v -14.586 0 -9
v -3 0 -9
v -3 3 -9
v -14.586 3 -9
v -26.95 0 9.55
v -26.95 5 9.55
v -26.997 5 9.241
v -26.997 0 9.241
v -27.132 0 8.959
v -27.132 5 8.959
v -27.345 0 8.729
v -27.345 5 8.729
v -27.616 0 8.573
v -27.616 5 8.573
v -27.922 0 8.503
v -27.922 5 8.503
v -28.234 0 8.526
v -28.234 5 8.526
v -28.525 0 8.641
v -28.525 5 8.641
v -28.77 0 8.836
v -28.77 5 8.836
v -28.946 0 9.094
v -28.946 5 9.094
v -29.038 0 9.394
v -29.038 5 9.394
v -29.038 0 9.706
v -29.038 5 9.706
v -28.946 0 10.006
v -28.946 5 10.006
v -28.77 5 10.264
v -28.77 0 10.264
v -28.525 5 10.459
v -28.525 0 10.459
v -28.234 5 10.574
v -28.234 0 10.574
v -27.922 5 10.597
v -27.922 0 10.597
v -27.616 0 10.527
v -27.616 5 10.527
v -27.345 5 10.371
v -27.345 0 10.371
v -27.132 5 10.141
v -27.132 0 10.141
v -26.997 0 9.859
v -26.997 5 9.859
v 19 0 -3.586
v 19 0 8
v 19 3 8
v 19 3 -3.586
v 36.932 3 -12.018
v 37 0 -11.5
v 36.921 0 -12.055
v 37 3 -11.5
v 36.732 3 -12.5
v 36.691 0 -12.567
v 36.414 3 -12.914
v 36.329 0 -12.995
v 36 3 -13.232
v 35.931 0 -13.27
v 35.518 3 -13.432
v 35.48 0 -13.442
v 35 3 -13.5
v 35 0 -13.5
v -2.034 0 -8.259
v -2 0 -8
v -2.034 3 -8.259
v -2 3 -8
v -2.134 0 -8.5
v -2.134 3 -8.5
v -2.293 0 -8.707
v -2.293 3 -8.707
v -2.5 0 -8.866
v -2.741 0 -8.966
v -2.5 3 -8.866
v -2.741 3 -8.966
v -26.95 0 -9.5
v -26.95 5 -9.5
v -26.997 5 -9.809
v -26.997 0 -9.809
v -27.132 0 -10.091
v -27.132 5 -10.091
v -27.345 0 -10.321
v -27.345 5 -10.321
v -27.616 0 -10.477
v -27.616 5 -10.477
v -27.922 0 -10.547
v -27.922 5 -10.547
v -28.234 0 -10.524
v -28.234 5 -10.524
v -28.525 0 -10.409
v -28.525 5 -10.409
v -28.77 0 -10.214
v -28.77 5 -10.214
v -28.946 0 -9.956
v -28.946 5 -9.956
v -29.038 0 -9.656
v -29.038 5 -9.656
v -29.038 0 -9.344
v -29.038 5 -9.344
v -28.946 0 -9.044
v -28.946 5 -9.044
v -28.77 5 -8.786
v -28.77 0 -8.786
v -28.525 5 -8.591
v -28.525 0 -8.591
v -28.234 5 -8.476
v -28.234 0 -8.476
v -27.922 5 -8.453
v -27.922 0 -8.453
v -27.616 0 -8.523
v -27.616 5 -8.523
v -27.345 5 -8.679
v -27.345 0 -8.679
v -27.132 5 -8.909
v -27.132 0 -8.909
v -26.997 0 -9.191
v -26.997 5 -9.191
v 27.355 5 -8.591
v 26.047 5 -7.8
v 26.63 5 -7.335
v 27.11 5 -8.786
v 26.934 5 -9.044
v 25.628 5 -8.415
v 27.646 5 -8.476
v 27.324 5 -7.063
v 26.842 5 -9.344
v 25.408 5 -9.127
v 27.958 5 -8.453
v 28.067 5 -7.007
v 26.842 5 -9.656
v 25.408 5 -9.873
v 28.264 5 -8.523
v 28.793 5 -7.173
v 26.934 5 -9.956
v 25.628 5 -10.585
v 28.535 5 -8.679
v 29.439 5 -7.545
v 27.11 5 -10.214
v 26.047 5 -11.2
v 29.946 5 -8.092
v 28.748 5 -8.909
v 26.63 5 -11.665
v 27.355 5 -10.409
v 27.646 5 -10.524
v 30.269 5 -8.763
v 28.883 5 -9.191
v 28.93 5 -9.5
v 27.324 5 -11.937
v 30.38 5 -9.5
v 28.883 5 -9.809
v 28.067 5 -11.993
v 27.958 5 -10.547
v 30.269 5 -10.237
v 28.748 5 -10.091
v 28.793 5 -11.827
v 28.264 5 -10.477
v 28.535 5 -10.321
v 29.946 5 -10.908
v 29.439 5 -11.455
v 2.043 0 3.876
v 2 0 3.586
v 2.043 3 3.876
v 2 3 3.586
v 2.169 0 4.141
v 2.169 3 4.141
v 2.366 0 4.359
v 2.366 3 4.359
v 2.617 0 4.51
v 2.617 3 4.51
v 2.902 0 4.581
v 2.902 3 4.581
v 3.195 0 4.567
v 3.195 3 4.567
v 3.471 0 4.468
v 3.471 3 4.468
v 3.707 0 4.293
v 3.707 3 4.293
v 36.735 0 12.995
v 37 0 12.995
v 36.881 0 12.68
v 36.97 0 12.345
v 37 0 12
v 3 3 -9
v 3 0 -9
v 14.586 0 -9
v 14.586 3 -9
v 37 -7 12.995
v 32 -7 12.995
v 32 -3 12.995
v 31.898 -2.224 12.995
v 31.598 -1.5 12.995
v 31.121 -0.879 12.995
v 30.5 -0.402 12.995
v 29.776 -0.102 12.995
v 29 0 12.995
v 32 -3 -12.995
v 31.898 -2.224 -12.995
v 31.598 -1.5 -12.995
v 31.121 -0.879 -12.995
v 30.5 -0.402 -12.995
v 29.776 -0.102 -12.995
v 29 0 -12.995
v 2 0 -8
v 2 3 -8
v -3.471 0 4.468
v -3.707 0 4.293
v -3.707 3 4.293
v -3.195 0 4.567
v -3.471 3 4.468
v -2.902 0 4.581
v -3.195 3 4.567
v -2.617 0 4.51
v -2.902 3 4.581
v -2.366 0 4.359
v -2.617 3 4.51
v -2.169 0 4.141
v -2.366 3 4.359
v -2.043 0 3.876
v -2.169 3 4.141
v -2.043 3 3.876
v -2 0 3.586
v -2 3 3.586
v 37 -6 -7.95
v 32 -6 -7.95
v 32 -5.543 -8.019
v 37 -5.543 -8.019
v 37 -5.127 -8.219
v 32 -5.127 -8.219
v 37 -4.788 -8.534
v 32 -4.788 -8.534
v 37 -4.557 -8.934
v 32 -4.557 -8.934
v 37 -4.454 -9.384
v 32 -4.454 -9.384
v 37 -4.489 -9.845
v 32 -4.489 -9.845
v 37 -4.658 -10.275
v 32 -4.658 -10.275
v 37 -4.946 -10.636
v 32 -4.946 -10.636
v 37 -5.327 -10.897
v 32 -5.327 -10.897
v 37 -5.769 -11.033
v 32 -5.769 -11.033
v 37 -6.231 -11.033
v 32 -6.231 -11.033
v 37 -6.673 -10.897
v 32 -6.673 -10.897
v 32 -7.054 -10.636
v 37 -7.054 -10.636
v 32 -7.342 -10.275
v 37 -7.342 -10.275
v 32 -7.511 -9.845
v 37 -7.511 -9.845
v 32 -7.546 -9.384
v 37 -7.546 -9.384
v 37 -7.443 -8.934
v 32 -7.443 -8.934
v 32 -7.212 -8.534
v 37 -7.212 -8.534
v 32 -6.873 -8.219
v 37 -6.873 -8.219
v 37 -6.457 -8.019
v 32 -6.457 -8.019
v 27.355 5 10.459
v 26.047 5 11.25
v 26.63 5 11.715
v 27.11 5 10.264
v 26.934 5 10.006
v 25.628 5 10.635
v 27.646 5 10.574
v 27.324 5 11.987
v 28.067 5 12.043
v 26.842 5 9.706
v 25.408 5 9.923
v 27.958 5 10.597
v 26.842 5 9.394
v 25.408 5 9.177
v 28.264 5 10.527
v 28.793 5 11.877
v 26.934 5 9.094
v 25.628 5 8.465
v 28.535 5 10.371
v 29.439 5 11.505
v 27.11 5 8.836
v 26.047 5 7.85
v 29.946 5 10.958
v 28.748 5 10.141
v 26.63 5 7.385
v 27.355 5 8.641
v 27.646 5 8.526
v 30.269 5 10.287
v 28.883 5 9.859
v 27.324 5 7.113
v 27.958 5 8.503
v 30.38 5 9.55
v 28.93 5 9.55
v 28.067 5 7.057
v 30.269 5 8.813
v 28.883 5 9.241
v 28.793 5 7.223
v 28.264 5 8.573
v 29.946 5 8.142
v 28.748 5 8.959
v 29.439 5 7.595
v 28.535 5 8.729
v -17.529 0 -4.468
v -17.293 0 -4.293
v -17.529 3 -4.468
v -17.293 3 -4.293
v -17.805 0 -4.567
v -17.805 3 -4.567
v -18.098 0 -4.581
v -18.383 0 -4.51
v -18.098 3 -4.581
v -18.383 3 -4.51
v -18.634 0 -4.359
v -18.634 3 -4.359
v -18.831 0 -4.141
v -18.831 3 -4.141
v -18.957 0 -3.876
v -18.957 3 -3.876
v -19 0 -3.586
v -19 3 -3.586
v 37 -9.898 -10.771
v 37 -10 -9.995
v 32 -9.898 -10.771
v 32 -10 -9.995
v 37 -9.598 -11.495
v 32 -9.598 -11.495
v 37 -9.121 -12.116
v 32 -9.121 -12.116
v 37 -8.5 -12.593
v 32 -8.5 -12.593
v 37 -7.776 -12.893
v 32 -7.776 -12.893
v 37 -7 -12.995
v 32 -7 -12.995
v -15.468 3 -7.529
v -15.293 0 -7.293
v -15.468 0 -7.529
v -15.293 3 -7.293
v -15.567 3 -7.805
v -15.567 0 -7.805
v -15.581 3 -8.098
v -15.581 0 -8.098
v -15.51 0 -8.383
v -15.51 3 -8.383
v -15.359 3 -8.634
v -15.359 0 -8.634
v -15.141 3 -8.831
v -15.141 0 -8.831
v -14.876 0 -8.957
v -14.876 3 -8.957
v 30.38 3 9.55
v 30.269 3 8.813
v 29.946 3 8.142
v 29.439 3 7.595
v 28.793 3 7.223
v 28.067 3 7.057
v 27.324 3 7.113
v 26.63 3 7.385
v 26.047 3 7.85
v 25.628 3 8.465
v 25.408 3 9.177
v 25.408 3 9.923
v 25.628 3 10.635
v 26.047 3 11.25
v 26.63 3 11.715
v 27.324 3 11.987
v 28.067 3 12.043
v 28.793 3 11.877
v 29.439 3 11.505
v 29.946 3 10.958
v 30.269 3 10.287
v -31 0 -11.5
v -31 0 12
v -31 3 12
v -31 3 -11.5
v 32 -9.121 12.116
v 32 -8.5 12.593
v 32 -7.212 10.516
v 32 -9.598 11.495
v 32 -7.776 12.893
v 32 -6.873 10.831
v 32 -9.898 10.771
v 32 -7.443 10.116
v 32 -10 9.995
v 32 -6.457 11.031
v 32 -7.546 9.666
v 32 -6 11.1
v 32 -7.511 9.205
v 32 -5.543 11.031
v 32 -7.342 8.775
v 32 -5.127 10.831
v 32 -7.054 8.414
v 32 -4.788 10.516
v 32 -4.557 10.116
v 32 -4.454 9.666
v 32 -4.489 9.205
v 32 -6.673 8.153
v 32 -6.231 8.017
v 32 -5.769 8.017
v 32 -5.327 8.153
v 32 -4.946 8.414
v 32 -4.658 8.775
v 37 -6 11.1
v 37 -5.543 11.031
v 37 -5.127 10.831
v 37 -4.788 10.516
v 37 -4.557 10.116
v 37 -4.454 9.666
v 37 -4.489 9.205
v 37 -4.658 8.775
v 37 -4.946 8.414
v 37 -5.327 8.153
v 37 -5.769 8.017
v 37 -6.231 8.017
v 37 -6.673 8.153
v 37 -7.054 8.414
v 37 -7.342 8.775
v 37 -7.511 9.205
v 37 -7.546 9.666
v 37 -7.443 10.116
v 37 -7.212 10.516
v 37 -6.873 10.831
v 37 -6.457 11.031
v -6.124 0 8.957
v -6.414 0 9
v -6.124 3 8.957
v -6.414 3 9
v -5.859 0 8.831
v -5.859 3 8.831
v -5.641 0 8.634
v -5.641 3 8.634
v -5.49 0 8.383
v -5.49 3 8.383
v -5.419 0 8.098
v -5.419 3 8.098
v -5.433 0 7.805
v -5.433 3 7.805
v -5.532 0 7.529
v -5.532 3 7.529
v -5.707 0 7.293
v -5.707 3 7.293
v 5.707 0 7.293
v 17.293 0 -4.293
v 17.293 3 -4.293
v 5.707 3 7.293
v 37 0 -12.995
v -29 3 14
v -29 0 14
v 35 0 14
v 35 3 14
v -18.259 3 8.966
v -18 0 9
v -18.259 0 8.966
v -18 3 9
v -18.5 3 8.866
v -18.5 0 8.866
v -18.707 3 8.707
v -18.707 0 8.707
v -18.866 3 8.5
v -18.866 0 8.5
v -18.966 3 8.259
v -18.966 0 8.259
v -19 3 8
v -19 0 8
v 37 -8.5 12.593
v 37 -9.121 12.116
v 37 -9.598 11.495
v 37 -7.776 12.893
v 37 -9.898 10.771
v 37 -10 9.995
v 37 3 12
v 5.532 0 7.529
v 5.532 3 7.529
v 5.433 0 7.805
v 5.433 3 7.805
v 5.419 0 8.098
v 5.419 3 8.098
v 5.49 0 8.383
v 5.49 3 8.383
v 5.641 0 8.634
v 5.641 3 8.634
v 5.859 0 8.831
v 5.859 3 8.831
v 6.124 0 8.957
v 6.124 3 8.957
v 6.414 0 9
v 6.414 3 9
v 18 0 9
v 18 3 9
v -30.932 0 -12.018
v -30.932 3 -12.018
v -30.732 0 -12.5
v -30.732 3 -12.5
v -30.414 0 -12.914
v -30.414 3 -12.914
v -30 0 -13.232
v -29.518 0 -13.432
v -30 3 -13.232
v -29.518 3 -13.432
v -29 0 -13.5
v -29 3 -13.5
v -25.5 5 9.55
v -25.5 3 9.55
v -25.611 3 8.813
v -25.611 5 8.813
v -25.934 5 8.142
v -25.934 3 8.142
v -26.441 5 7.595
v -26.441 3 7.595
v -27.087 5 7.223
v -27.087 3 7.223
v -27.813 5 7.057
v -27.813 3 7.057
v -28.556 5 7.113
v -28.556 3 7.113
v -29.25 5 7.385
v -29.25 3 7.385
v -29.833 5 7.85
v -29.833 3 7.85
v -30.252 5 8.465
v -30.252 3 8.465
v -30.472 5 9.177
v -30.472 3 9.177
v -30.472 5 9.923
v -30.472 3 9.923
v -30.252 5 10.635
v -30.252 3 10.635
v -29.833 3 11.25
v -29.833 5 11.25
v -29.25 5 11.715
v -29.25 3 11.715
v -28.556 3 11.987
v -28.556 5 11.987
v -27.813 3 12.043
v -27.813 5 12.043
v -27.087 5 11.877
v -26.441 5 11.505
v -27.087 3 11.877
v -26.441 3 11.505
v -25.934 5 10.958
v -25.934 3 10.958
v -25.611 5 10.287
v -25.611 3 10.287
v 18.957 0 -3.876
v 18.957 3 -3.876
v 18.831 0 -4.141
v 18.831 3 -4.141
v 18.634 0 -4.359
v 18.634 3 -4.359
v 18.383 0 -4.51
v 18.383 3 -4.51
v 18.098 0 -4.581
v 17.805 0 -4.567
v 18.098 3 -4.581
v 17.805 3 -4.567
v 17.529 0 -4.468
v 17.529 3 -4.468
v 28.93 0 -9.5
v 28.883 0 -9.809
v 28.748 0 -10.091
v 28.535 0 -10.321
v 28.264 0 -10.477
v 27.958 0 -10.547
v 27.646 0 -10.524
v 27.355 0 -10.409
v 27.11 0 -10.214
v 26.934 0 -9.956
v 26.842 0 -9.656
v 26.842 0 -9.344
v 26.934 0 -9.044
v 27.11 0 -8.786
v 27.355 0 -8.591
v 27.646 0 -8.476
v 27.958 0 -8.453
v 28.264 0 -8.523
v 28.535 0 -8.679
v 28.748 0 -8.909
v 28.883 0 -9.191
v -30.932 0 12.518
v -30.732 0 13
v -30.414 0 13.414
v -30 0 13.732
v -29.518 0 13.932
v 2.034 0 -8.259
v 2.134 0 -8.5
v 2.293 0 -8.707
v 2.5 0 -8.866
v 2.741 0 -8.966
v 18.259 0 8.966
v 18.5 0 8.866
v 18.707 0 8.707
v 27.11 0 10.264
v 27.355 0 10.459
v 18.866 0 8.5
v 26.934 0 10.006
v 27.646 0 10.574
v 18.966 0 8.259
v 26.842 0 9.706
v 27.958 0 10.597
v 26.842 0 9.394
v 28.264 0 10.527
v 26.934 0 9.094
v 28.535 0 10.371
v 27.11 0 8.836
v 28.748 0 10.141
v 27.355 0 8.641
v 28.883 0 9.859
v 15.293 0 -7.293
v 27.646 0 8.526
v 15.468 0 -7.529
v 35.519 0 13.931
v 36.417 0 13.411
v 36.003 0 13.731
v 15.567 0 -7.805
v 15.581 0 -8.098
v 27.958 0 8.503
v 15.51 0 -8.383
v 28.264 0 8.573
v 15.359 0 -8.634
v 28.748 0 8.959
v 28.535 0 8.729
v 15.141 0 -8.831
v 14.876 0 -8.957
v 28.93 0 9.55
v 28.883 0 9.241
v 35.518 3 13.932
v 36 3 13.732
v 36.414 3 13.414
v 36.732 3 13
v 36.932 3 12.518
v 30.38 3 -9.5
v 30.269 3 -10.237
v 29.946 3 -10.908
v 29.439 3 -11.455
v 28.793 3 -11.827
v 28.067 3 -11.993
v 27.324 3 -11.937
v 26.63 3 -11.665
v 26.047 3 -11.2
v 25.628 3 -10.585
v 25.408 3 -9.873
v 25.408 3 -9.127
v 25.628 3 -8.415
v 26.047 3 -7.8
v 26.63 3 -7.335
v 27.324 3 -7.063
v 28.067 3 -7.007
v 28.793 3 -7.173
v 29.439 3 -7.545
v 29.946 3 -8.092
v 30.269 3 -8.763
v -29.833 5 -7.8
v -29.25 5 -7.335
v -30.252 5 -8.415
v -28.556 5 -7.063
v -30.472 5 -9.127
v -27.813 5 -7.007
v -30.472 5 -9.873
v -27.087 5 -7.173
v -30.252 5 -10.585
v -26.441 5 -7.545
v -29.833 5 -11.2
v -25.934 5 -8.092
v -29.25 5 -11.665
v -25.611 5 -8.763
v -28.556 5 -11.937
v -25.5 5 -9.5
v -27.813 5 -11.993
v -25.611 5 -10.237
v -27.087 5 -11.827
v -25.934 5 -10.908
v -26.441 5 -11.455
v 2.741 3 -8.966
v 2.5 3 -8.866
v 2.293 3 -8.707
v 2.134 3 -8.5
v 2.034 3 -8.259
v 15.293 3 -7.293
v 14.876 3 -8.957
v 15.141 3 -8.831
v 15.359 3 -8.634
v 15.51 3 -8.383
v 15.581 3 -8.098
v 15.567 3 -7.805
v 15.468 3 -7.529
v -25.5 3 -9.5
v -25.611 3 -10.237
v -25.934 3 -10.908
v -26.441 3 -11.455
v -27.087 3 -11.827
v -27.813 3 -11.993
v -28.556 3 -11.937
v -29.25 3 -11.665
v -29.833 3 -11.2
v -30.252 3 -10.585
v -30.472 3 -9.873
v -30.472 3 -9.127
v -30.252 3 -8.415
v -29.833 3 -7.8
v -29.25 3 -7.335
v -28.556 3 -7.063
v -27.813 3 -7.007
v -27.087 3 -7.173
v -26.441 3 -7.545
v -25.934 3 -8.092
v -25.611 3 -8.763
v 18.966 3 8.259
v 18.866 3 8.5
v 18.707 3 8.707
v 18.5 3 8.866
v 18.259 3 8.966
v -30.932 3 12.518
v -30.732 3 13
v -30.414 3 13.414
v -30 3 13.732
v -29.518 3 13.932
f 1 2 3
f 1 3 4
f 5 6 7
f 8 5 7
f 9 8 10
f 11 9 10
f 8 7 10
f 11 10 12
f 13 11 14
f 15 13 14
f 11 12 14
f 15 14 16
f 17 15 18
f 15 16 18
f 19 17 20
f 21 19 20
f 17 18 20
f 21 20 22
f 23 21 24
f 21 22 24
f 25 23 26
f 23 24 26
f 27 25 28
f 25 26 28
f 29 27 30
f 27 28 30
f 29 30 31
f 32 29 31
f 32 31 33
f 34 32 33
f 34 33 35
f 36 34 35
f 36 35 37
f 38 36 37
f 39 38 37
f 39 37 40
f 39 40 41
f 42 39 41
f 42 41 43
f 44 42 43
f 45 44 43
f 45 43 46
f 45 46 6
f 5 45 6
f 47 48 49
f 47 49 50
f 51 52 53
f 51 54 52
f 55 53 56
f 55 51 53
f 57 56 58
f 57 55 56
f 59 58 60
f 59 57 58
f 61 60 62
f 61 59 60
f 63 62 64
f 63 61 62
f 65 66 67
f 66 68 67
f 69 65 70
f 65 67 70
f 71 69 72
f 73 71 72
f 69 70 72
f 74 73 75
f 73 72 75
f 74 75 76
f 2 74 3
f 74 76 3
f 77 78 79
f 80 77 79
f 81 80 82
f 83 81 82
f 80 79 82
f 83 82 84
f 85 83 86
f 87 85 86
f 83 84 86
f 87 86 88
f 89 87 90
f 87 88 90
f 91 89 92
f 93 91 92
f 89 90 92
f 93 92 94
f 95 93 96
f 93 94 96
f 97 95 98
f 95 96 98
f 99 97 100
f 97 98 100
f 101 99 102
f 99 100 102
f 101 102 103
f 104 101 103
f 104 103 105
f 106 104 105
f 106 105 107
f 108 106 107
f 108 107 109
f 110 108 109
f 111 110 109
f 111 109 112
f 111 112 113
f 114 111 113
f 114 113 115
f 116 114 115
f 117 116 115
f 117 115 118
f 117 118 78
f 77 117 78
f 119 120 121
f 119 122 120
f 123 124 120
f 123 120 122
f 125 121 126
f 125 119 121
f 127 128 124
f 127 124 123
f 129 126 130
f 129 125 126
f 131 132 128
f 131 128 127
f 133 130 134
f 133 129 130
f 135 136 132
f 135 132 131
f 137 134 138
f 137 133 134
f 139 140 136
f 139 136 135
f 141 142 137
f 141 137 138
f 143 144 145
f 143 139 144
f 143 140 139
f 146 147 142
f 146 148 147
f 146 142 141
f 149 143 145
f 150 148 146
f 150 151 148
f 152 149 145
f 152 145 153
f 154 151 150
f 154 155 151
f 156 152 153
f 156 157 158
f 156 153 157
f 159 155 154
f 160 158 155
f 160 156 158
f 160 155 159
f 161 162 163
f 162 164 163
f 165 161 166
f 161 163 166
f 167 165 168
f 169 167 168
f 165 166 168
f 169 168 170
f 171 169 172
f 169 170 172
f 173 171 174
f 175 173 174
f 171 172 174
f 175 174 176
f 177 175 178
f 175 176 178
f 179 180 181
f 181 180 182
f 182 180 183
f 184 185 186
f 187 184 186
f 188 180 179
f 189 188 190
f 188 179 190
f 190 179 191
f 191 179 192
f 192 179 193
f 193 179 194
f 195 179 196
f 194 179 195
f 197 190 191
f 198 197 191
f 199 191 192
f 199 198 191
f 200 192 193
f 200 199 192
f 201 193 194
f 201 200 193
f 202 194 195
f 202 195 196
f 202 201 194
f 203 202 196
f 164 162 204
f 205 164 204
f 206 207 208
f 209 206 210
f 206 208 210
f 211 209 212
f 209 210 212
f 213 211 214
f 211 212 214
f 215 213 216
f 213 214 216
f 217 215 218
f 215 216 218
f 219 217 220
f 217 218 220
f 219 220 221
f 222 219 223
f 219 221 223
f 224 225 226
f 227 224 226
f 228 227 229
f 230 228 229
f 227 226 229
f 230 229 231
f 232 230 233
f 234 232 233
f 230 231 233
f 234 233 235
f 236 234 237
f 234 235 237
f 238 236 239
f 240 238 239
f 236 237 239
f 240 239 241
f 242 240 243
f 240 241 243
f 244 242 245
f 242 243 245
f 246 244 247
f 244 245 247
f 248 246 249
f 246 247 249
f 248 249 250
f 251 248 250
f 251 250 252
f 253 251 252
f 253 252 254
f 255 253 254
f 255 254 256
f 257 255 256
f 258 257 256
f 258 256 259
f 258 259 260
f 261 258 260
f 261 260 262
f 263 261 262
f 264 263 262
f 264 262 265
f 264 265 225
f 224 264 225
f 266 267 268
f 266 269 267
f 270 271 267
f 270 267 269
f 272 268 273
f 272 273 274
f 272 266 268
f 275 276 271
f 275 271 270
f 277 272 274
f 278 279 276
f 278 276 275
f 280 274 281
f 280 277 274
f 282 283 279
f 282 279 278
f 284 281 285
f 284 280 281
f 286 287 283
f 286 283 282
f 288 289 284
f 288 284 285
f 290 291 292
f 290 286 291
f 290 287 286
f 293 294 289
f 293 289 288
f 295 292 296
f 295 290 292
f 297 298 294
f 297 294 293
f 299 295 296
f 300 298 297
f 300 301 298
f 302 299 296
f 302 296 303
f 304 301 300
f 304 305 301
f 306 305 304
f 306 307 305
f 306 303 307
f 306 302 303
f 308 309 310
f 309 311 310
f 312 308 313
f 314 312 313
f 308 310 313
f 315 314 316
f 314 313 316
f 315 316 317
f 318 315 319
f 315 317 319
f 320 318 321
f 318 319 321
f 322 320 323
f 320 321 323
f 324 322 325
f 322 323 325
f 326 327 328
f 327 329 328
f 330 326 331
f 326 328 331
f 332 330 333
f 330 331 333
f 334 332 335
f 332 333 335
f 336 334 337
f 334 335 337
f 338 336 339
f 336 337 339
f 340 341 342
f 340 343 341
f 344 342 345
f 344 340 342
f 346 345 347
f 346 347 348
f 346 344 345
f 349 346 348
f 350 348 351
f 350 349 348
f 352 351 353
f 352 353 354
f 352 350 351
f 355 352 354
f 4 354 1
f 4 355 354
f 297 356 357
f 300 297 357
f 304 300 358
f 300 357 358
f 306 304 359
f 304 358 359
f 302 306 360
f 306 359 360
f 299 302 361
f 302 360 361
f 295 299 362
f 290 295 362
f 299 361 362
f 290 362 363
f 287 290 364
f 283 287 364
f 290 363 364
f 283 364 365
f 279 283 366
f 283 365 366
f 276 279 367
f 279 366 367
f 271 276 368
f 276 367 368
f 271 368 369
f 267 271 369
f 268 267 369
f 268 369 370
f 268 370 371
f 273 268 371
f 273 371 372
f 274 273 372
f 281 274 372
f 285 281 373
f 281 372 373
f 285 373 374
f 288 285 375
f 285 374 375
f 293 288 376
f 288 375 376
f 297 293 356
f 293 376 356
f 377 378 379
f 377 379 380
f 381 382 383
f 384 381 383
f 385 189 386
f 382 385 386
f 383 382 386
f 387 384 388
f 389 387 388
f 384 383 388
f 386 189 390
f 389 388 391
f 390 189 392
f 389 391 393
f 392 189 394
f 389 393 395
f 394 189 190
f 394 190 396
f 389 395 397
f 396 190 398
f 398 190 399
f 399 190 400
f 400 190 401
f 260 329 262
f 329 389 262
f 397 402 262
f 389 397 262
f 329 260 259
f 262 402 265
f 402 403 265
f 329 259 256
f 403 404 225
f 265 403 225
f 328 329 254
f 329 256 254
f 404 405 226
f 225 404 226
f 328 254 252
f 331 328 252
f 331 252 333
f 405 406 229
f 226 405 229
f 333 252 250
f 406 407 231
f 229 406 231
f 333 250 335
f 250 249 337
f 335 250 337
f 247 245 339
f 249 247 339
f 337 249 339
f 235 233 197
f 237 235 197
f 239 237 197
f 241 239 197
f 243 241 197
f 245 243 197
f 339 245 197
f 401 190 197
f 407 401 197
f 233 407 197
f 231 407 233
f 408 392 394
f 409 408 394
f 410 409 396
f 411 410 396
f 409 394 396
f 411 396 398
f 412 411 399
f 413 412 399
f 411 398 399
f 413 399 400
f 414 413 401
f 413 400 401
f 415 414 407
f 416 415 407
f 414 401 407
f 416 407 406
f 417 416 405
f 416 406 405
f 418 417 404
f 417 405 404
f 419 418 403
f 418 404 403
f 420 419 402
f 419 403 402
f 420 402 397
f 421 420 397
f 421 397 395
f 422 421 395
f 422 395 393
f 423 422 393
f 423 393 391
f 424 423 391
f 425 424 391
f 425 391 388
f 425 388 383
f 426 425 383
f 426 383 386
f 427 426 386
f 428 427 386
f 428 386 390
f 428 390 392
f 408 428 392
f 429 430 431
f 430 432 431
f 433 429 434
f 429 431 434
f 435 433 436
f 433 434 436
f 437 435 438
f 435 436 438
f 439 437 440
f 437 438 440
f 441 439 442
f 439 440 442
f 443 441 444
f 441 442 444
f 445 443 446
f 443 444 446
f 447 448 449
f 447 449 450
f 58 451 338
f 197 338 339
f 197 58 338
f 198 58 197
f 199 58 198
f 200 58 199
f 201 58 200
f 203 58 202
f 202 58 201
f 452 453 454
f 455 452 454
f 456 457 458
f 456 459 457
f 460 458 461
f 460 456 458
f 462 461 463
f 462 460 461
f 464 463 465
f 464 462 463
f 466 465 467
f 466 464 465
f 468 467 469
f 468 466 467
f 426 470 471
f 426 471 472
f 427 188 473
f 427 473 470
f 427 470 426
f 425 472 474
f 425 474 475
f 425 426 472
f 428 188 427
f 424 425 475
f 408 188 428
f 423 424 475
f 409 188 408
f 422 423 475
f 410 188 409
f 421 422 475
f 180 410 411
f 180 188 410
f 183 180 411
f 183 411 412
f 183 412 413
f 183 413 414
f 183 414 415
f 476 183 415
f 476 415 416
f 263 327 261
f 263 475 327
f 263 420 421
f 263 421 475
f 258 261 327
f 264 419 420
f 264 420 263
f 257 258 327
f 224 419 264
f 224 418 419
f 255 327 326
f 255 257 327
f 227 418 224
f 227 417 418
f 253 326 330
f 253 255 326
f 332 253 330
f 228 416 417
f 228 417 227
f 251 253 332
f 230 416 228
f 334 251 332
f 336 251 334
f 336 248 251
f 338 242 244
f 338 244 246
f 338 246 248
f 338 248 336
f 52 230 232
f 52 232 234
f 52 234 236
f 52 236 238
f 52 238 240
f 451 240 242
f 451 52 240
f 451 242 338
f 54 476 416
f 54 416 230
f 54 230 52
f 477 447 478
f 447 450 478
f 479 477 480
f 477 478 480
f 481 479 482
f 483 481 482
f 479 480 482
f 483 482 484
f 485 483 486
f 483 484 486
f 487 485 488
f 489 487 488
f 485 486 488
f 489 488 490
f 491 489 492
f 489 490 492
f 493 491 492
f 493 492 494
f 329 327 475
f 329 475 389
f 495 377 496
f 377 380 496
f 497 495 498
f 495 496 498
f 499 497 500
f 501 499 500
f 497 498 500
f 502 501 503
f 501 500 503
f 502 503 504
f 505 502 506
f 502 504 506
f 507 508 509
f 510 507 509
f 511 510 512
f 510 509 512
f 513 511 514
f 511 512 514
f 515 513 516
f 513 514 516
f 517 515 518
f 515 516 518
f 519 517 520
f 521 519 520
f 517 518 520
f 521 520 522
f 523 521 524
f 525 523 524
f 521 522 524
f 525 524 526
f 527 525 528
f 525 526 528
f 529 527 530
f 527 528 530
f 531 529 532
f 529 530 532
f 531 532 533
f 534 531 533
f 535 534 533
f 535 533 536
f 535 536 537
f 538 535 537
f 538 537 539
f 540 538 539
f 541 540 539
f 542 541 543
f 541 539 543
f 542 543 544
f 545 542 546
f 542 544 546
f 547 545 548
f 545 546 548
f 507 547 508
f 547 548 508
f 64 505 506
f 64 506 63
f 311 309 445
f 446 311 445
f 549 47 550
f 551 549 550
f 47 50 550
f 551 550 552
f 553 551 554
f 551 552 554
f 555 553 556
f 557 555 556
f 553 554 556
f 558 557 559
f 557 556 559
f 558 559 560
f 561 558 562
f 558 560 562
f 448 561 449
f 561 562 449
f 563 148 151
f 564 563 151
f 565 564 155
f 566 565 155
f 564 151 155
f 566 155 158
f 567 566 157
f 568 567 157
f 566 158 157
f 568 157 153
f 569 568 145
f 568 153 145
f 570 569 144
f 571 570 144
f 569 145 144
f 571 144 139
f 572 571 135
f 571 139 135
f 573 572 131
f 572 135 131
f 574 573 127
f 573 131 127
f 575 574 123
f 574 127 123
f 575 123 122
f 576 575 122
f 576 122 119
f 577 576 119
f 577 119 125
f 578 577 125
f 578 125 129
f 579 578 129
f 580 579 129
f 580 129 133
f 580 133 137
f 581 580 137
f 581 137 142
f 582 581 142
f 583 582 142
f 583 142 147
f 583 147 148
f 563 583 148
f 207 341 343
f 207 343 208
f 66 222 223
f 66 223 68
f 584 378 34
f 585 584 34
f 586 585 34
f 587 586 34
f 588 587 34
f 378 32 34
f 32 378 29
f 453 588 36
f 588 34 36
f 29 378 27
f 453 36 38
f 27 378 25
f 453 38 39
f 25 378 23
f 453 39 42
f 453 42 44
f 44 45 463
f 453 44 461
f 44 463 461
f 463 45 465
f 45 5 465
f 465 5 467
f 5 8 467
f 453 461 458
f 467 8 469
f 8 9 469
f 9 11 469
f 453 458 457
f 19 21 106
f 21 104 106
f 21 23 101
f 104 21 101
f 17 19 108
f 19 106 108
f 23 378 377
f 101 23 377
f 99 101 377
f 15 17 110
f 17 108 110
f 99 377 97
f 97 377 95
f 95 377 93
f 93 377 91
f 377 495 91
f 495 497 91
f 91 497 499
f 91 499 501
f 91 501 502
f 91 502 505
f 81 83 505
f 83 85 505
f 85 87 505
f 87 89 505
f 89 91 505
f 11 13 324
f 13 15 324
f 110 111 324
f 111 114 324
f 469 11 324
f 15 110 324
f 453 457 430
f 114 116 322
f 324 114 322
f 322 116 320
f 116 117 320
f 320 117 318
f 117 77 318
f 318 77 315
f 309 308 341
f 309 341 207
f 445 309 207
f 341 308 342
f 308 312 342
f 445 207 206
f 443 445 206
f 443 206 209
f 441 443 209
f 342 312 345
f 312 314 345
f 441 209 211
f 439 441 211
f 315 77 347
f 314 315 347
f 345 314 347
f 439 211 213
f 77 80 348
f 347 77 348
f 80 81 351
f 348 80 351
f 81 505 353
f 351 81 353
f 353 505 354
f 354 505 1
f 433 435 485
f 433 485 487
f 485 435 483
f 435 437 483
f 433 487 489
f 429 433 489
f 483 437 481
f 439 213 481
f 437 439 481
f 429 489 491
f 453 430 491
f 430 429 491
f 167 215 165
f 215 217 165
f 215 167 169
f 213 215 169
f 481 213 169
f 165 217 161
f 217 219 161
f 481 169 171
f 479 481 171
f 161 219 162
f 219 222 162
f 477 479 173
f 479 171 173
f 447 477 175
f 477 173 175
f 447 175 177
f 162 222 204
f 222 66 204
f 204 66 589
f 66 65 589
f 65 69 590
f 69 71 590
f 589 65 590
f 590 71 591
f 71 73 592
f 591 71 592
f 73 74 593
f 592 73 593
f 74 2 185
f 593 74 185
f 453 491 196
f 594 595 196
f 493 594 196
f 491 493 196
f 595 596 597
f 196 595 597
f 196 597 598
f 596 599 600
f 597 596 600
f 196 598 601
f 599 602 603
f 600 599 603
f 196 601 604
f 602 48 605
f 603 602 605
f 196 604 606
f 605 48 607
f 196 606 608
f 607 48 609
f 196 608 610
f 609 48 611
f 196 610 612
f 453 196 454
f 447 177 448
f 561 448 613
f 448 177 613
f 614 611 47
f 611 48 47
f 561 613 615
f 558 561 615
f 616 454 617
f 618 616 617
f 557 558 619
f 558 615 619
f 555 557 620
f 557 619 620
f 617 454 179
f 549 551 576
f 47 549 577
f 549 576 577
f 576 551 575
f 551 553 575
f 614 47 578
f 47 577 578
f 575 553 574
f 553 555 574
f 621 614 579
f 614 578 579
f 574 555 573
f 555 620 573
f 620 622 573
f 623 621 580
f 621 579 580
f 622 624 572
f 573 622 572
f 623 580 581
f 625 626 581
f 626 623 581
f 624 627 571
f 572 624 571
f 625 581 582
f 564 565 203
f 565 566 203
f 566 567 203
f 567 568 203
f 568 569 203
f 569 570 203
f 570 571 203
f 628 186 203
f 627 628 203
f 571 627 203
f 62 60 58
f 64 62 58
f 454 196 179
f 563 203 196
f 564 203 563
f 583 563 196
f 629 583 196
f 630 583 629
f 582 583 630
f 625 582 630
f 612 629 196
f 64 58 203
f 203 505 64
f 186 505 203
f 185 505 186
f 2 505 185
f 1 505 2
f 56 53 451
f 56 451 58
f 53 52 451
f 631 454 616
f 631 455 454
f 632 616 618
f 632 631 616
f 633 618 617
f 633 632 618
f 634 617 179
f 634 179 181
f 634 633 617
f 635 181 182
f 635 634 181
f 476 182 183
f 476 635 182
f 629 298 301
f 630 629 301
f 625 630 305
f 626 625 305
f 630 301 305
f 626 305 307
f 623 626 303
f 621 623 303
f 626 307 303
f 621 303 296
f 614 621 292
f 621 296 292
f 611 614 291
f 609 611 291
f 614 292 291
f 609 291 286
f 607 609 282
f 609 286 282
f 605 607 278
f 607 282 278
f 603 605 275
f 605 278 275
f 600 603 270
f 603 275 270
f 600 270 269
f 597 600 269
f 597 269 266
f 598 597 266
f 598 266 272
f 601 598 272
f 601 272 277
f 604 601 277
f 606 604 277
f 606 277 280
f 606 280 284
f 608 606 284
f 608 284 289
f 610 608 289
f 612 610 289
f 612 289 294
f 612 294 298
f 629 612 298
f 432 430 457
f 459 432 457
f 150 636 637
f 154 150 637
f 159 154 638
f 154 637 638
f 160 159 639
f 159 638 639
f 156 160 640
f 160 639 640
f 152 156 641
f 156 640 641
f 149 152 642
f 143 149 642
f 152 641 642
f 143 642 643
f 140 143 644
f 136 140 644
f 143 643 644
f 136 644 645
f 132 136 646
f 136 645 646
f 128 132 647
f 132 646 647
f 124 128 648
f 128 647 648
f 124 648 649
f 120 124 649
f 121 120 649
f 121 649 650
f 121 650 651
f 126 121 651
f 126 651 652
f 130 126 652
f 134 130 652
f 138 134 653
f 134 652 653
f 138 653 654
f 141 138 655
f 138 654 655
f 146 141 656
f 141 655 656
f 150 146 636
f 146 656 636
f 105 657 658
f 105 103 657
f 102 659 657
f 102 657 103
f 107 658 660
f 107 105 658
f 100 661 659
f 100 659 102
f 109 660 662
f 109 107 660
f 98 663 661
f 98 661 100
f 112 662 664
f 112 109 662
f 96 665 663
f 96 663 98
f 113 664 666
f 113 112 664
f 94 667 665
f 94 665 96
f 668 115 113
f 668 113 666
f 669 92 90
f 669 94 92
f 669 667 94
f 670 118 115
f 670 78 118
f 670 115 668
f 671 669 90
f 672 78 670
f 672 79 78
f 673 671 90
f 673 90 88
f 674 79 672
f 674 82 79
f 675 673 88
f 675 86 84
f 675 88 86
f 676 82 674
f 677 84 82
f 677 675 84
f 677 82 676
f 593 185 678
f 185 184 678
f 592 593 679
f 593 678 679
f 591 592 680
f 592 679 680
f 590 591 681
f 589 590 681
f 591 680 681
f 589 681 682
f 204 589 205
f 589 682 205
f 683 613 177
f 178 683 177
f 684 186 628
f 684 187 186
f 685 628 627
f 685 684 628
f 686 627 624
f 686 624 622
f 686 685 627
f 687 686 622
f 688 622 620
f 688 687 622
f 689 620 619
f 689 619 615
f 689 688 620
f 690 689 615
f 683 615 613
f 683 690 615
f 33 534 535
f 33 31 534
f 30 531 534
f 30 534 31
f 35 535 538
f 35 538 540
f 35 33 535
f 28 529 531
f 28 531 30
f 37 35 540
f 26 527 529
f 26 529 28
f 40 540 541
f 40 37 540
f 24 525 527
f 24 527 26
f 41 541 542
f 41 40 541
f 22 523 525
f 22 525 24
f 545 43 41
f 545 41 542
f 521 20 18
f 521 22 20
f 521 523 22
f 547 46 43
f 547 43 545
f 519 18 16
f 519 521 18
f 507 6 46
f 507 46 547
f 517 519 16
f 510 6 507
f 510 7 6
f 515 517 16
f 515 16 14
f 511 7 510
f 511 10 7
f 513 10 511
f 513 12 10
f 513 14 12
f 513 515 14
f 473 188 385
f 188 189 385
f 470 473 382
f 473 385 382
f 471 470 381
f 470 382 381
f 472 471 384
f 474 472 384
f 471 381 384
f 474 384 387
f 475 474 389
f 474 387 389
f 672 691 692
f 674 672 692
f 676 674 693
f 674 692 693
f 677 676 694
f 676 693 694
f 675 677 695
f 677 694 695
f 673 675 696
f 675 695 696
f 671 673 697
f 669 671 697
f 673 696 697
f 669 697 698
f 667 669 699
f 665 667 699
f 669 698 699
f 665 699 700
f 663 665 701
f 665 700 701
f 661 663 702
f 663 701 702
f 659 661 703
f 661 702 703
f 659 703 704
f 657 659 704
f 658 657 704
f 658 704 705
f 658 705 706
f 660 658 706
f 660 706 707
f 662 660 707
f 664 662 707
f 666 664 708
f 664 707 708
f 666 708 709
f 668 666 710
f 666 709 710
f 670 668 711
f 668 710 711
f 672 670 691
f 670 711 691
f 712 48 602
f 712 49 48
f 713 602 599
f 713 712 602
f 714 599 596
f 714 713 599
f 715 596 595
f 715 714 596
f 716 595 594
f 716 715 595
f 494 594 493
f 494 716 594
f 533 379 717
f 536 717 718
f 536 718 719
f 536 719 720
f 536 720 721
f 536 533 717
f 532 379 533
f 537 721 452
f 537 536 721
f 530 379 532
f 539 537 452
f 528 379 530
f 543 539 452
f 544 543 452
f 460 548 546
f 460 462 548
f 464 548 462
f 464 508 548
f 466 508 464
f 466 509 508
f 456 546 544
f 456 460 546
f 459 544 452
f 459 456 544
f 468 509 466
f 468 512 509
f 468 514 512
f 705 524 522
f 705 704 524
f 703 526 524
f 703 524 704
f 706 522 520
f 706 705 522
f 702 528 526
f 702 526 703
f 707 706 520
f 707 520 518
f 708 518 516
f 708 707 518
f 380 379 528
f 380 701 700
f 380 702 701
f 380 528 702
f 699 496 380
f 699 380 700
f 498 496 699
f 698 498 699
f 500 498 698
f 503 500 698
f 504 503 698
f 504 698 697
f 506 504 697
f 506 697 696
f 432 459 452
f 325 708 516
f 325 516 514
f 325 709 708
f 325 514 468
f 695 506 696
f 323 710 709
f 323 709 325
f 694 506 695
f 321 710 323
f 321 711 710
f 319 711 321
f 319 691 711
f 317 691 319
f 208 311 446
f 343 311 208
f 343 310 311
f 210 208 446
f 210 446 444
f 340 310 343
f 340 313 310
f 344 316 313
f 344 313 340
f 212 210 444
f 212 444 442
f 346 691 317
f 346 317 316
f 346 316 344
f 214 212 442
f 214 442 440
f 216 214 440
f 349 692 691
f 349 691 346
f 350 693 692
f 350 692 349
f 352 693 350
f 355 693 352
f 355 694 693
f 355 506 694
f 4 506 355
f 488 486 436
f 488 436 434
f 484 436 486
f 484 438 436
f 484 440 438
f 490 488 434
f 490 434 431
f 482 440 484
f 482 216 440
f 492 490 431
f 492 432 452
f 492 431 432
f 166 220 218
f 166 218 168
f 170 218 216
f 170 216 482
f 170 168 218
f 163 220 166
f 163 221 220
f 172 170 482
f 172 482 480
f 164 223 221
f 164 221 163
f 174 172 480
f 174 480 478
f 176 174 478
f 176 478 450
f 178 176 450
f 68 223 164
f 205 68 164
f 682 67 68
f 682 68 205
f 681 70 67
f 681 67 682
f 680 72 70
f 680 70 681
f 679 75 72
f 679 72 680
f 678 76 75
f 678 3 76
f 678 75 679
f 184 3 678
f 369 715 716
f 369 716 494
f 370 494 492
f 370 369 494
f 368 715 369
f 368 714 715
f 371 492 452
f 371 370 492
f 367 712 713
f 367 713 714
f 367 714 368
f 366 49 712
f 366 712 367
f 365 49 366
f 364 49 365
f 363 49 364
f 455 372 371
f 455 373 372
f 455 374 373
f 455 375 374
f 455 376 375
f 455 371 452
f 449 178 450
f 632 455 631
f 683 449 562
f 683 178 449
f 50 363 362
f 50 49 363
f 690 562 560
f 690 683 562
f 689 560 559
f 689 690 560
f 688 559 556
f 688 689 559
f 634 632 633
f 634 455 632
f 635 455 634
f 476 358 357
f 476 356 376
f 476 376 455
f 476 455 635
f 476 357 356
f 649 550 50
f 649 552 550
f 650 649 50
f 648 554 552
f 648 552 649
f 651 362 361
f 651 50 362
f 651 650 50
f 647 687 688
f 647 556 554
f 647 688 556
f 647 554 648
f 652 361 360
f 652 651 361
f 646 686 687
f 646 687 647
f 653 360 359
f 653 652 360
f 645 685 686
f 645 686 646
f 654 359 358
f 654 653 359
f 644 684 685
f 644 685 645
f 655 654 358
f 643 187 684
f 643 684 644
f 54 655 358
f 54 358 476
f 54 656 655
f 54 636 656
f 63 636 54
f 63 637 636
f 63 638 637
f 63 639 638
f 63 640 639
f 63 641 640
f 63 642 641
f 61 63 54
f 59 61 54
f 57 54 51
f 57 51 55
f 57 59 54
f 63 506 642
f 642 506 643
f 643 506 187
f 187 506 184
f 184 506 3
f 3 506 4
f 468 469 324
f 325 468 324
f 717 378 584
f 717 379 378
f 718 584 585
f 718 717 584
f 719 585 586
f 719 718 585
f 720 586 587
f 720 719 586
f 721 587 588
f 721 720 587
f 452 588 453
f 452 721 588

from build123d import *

# Parameters (mm, degrees)
SKETCH1_W            = 68
SKETCH1_H            = 27.5
BOSS_EXTRUDE1_DEPTH  = 3
FILLET1_R            = 2
SKETCH2_R            = 2.5
BOSS_EXTRUDE2_DEPTH  = 2
SKETCH4_R            = 1.05
CUT_EXTRUDE2_DEPTH   = 12
SKETCH5_W            = 5
SKETCH5_H            = 25.989939454
BOSS_EXTRUDE3_DEPTH  = 10
SKETCH6_R            = 1.55
CUT_EXTRUDE3_DEPTH   = 10
FILLET2_R            = 3
FILLET3_R            = 3
CUT_EXTRUDE4_DEPTH   = 10
FILLET4_R            = 1
FILLET4_OF_MIRROR1_R = 1


with BuildPart() as part:
    # Sketch1 → Boss-Extrude1 (new body)
    with BuildSketch(Plane(origin=(0, 0, 0), x_dir=(1, 0, 0), z_dir=(0, 1, 0))):
        with Locations((3, -0.25)):
            Rectangle(SKETCH1_W, SKETCH1_H)
    extrude(amount=BOSS_EXTRUDE1_DEPTH)

    # Fillet1
    fillet1_edges = [part.edges().sort_by_distance(p)[0] for p in [
        (-31, 1.5, -13.5),
        (37, 1.5, -13.5),
        (37, 1.5, 14),
        (-31, 1.5, 14),
    ]]
    fillet(fillet1_edges, radius=FILLET1_R)

    # Sketch2 → Boss-Extrude2 (add)
    with BuildSketch(Plane(origin=(0, 3, 0), x_dir=(1, 0, 0), z_dir=(0, 1, 0))):
        with Locations((-28, 9.5)):
            Circle(SKETCH2_R)
        with Locations((27.88, 9.5)):
            Circle(SKETCH2_R)
        with Locations((27.88, -9.55)):
            Circle(SKETCH2_R)
        with Locations((-28, -9.55)):
            Circle(SKETCH2_R)
    extrude(amount=BOSS_EXTRUDE2_DEPTH)

    # Sketch4 → Cut-Extrude2 (cut)
    with BuildSketch(Plane(origin=(0, 5, 0), x_dir=(1, 0, 0), z_dir=(0, 1, 0))):
        with Locations((-28, 9.5)):
            Circle(SKETCH4_R)
        with Locations((-28, -9.55)):
            Circle(SKETCH4_R)
        with Locations((27.88, -9.55)):
            Circle(SKETCH4_R)
        with Locations((27.88, 9.5)):
            Circle(SKETCH4_R)
    extrude(amount=-CUT_EXTRUDE2_DEPTH, mode=Mode.SUBTRACT)

    # Sketch5 → Boss-Extrude3 (add)
    with BuildSketch(Plane(origin=(0, 0, 0), x_dir=(-1, 0, 0), z_dir=(0, -1, 0))):
        with Locations((-34.5, 0)):
            Rectangle(SKETCH5_W, SKETCH5_H)
    extrude(amount=BOSS_EXTRUDE3_DEPTH)

    # Sketch6 → Cut-Extrude3 (cut)
    with BuildSketch(Plane.ZY.offset(-32)):
        with Locations((-9.5, -6)):
            Circle(SKETCH6_R)
        with Locations((9.55, -6)):
            Circle(SKETCH6_R)
    extrude(amount=-CUT_EXTRUDE3_DEPTH, mode=Mode.SUBTRACT)

    # Fillet2
    fillet2_edges = [part.edges().sort_by_distance(p)[0] for p in [
        (34.5, -10, 12.994969727),
        (34.5, -10, -12.994969727),
    ]]
    fillet(fillet2_edges, radius=FILLET2_R)

    # Fillet3
    fillet3_edges = [part.edges().sort_by_distance(p)[0] for p in [
        (32, 0, 0),
    ]]
    fillet(fillet3_edges, radius=FILLET3_R)

    # Sketch7 → Cut-Extrude4 (cut)
    with BuildSketch(Plane(origin=(0, 0, 0), x_dir=(-1, 0, 0), z_dir=(0, -1, 0))):
        Polygon((19, -9), (19, 6), (4, -9), align=None)
        Polygon((17, 9), (2, -6), (2, 9), align=None)
    cut_extrude4 = extrude(amount=-CUT_EXTRUDE4_DEPTH, mode=Mode.SUBTRACT)

    # Fillet4
    fillet4_edges = [part.edges().sort_by_distance(p)[0] for p in [
        (-2, 1.5, -9),
        (-17, 1.5, -9),
        (-2, 1.5, 6),
        (-19, 1.5, 9),
        (-4, 1.5, 9),
        (-19, 1.5, -6),
    ]]
    fillet(fillet4_edges, radius=FILLET4_R)

    # Mirror1: Cut-Extrude4 across plane
    add(cut_extrude4.mirror(Plane(origin=(0, 0, 0), x_dir=(0, 0, 1), z_dir=(1, 0, 0))), mode=Mode.SUBTRACT)

    # Fillet4 of Mirror1
    fillet4_of_mirror1_edges = [part.edges().sort_by_distance(p)[0] for p in [
        (2, 1.5, -9),
        (17, 1.5, -9),
        (2, 1.5, 6),
        (19, 1.5, 9),
        (4, 1.5, 9),
        (19, 1.5, -6),
    ]]
    fillet(fillet4_of_mirror1_edges, radius=FILLET4_OF_MIRROR1_R)


solid = part.part
